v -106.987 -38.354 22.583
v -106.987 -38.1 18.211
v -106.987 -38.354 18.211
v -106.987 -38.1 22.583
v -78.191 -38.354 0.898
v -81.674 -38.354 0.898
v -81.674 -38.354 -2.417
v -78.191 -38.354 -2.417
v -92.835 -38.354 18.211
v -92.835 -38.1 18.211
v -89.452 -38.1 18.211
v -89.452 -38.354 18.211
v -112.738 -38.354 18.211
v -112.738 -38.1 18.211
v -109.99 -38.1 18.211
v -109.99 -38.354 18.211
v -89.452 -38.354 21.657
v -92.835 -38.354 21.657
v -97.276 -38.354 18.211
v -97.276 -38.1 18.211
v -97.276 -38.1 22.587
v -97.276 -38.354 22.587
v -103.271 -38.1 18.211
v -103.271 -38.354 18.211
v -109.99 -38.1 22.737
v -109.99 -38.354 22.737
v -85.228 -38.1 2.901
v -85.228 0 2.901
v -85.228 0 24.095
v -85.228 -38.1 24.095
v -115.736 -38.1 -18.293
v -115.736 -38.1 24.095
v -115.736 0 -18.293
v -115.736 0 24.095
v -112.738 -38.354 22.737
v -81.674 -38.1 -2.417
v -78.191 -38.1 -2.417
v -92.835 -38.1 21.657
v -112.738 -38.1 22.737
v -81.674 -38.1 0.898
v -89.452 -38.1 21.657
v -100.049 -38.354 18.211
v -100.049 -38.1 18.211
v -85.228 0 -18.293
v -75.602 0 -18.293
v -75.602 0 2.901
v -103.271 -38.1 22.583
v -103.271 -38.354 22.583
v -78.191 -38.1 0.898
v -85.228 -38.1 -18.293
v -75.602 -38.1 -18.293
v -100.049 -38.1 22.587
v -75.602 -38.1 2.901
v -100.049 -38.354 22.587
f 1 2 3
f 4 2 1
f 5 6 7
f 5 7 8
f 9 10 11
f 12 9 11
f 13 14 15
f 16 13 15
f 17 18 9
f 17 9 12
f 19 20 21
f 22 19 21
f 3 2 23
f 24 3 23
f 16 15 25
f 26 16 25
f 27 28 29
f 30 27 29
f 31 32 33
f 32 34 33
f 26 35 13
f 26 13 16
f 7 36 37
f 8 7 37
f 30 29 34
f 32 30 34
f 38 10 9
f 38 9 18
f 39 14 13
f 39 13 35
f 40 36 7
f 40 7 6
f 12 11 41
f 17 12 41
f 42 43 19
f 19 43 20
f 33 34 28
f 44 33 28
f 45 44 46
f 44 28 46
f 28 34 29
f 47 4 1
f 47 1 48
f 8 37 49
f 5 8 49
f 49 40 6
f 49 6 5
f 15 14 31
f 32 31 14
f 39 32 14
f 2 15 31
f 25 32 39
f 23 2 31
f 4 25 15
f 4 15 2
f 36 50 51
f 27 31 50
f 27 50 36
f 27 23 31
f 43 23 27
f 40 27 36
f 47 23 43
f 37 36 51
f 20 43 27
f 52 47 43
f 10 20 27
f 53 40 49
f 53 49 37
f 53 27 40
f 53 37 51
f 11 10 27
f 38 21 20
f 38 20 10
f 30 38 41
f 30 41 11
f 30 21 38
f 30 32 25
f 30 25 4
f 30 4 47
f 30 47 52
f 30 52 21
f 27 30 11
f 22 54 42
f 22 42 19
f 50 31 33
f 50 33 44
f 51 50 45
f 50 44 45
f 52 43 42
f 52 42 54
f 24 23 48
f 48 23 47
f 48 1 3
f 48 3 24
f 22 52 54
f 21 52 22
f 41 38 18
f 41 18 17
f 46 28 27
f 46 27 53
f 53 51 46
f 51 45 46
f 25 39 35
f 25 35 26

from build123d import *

# Parameters (mm, degrees)
F0_W     = 9.6260905266
F0_H     = 21.1938368157
F1_DEPTH = 12.7
F2_DEPTH = 25.4
F4_W     = 3.3827349544
F4_H     = 3.4457910806
F3_W     = 2.7738437057
F3_H     = 4.3759718537
F3_W_2   = 3.7164986134
F3_H_2   = 4.3712295592
F3_W_3   = 2.7477294207
F3_H_3   = 4.5251846313
F3_W_4   = 3.4826546907
F3_H_4   = 3.3152103424
F5_DEPTH = 0.254


with BuildPart() as f1:
    # F0 (on Front) → F1 (new body)
    with BuildSketch(Plane.XZ):
        Polygon((-85.2284654975, 24.0949820727), (-115.7357469201, 24.0949820727), (-115.7357469201, -18.2926915586), (-85.2284654975, -18.2926915586), (-85.2284654975, 2.9011452571), align=None)
        with Locations((-80.4154202342, -7.6957731508)):
            Rectangle(F0_W, F0_H)
    extrude(amount=F1_DEPTH)

    # F2 (add): a face of the model
    f2_faces = [f1.faces().sort_by_distance(p)[0] for p in [
        (-97.7476505301, -12.7, 1.4571198832),
    ]]
    extrude(f2_faces, amount=F2_DEPTH)

    # F4 (on face) + F3 (on face) → F5 (join)
    with BuildSketch(Plane.XZ.offset(38.1)):
        with Locations((-91.1433510482, 19.9342770502)):
            Rectangle(F4_W, F4_H)
    with BuildSketch(Plane.XZ.offset(38.1)):
        with Locations((-98.6624695361, 20.3993674368)):
            Rectangle(F3_W, F3_H)
        with Locations((-105.1291897893, 20.3969962895)):
            Rectangle(F3_W_2, F3_H_2)
        with Locations((-111.3641187549, 20.4739738256)):
            Rectangle(F3_W_3, F3_H_3)
        with Locations((-79.9321979284, -0.7592802867)):
            Rectangle(F3_W_4, F3_H_4)
    extrude(amount=F5_DEPTH)


solid = f1.part
